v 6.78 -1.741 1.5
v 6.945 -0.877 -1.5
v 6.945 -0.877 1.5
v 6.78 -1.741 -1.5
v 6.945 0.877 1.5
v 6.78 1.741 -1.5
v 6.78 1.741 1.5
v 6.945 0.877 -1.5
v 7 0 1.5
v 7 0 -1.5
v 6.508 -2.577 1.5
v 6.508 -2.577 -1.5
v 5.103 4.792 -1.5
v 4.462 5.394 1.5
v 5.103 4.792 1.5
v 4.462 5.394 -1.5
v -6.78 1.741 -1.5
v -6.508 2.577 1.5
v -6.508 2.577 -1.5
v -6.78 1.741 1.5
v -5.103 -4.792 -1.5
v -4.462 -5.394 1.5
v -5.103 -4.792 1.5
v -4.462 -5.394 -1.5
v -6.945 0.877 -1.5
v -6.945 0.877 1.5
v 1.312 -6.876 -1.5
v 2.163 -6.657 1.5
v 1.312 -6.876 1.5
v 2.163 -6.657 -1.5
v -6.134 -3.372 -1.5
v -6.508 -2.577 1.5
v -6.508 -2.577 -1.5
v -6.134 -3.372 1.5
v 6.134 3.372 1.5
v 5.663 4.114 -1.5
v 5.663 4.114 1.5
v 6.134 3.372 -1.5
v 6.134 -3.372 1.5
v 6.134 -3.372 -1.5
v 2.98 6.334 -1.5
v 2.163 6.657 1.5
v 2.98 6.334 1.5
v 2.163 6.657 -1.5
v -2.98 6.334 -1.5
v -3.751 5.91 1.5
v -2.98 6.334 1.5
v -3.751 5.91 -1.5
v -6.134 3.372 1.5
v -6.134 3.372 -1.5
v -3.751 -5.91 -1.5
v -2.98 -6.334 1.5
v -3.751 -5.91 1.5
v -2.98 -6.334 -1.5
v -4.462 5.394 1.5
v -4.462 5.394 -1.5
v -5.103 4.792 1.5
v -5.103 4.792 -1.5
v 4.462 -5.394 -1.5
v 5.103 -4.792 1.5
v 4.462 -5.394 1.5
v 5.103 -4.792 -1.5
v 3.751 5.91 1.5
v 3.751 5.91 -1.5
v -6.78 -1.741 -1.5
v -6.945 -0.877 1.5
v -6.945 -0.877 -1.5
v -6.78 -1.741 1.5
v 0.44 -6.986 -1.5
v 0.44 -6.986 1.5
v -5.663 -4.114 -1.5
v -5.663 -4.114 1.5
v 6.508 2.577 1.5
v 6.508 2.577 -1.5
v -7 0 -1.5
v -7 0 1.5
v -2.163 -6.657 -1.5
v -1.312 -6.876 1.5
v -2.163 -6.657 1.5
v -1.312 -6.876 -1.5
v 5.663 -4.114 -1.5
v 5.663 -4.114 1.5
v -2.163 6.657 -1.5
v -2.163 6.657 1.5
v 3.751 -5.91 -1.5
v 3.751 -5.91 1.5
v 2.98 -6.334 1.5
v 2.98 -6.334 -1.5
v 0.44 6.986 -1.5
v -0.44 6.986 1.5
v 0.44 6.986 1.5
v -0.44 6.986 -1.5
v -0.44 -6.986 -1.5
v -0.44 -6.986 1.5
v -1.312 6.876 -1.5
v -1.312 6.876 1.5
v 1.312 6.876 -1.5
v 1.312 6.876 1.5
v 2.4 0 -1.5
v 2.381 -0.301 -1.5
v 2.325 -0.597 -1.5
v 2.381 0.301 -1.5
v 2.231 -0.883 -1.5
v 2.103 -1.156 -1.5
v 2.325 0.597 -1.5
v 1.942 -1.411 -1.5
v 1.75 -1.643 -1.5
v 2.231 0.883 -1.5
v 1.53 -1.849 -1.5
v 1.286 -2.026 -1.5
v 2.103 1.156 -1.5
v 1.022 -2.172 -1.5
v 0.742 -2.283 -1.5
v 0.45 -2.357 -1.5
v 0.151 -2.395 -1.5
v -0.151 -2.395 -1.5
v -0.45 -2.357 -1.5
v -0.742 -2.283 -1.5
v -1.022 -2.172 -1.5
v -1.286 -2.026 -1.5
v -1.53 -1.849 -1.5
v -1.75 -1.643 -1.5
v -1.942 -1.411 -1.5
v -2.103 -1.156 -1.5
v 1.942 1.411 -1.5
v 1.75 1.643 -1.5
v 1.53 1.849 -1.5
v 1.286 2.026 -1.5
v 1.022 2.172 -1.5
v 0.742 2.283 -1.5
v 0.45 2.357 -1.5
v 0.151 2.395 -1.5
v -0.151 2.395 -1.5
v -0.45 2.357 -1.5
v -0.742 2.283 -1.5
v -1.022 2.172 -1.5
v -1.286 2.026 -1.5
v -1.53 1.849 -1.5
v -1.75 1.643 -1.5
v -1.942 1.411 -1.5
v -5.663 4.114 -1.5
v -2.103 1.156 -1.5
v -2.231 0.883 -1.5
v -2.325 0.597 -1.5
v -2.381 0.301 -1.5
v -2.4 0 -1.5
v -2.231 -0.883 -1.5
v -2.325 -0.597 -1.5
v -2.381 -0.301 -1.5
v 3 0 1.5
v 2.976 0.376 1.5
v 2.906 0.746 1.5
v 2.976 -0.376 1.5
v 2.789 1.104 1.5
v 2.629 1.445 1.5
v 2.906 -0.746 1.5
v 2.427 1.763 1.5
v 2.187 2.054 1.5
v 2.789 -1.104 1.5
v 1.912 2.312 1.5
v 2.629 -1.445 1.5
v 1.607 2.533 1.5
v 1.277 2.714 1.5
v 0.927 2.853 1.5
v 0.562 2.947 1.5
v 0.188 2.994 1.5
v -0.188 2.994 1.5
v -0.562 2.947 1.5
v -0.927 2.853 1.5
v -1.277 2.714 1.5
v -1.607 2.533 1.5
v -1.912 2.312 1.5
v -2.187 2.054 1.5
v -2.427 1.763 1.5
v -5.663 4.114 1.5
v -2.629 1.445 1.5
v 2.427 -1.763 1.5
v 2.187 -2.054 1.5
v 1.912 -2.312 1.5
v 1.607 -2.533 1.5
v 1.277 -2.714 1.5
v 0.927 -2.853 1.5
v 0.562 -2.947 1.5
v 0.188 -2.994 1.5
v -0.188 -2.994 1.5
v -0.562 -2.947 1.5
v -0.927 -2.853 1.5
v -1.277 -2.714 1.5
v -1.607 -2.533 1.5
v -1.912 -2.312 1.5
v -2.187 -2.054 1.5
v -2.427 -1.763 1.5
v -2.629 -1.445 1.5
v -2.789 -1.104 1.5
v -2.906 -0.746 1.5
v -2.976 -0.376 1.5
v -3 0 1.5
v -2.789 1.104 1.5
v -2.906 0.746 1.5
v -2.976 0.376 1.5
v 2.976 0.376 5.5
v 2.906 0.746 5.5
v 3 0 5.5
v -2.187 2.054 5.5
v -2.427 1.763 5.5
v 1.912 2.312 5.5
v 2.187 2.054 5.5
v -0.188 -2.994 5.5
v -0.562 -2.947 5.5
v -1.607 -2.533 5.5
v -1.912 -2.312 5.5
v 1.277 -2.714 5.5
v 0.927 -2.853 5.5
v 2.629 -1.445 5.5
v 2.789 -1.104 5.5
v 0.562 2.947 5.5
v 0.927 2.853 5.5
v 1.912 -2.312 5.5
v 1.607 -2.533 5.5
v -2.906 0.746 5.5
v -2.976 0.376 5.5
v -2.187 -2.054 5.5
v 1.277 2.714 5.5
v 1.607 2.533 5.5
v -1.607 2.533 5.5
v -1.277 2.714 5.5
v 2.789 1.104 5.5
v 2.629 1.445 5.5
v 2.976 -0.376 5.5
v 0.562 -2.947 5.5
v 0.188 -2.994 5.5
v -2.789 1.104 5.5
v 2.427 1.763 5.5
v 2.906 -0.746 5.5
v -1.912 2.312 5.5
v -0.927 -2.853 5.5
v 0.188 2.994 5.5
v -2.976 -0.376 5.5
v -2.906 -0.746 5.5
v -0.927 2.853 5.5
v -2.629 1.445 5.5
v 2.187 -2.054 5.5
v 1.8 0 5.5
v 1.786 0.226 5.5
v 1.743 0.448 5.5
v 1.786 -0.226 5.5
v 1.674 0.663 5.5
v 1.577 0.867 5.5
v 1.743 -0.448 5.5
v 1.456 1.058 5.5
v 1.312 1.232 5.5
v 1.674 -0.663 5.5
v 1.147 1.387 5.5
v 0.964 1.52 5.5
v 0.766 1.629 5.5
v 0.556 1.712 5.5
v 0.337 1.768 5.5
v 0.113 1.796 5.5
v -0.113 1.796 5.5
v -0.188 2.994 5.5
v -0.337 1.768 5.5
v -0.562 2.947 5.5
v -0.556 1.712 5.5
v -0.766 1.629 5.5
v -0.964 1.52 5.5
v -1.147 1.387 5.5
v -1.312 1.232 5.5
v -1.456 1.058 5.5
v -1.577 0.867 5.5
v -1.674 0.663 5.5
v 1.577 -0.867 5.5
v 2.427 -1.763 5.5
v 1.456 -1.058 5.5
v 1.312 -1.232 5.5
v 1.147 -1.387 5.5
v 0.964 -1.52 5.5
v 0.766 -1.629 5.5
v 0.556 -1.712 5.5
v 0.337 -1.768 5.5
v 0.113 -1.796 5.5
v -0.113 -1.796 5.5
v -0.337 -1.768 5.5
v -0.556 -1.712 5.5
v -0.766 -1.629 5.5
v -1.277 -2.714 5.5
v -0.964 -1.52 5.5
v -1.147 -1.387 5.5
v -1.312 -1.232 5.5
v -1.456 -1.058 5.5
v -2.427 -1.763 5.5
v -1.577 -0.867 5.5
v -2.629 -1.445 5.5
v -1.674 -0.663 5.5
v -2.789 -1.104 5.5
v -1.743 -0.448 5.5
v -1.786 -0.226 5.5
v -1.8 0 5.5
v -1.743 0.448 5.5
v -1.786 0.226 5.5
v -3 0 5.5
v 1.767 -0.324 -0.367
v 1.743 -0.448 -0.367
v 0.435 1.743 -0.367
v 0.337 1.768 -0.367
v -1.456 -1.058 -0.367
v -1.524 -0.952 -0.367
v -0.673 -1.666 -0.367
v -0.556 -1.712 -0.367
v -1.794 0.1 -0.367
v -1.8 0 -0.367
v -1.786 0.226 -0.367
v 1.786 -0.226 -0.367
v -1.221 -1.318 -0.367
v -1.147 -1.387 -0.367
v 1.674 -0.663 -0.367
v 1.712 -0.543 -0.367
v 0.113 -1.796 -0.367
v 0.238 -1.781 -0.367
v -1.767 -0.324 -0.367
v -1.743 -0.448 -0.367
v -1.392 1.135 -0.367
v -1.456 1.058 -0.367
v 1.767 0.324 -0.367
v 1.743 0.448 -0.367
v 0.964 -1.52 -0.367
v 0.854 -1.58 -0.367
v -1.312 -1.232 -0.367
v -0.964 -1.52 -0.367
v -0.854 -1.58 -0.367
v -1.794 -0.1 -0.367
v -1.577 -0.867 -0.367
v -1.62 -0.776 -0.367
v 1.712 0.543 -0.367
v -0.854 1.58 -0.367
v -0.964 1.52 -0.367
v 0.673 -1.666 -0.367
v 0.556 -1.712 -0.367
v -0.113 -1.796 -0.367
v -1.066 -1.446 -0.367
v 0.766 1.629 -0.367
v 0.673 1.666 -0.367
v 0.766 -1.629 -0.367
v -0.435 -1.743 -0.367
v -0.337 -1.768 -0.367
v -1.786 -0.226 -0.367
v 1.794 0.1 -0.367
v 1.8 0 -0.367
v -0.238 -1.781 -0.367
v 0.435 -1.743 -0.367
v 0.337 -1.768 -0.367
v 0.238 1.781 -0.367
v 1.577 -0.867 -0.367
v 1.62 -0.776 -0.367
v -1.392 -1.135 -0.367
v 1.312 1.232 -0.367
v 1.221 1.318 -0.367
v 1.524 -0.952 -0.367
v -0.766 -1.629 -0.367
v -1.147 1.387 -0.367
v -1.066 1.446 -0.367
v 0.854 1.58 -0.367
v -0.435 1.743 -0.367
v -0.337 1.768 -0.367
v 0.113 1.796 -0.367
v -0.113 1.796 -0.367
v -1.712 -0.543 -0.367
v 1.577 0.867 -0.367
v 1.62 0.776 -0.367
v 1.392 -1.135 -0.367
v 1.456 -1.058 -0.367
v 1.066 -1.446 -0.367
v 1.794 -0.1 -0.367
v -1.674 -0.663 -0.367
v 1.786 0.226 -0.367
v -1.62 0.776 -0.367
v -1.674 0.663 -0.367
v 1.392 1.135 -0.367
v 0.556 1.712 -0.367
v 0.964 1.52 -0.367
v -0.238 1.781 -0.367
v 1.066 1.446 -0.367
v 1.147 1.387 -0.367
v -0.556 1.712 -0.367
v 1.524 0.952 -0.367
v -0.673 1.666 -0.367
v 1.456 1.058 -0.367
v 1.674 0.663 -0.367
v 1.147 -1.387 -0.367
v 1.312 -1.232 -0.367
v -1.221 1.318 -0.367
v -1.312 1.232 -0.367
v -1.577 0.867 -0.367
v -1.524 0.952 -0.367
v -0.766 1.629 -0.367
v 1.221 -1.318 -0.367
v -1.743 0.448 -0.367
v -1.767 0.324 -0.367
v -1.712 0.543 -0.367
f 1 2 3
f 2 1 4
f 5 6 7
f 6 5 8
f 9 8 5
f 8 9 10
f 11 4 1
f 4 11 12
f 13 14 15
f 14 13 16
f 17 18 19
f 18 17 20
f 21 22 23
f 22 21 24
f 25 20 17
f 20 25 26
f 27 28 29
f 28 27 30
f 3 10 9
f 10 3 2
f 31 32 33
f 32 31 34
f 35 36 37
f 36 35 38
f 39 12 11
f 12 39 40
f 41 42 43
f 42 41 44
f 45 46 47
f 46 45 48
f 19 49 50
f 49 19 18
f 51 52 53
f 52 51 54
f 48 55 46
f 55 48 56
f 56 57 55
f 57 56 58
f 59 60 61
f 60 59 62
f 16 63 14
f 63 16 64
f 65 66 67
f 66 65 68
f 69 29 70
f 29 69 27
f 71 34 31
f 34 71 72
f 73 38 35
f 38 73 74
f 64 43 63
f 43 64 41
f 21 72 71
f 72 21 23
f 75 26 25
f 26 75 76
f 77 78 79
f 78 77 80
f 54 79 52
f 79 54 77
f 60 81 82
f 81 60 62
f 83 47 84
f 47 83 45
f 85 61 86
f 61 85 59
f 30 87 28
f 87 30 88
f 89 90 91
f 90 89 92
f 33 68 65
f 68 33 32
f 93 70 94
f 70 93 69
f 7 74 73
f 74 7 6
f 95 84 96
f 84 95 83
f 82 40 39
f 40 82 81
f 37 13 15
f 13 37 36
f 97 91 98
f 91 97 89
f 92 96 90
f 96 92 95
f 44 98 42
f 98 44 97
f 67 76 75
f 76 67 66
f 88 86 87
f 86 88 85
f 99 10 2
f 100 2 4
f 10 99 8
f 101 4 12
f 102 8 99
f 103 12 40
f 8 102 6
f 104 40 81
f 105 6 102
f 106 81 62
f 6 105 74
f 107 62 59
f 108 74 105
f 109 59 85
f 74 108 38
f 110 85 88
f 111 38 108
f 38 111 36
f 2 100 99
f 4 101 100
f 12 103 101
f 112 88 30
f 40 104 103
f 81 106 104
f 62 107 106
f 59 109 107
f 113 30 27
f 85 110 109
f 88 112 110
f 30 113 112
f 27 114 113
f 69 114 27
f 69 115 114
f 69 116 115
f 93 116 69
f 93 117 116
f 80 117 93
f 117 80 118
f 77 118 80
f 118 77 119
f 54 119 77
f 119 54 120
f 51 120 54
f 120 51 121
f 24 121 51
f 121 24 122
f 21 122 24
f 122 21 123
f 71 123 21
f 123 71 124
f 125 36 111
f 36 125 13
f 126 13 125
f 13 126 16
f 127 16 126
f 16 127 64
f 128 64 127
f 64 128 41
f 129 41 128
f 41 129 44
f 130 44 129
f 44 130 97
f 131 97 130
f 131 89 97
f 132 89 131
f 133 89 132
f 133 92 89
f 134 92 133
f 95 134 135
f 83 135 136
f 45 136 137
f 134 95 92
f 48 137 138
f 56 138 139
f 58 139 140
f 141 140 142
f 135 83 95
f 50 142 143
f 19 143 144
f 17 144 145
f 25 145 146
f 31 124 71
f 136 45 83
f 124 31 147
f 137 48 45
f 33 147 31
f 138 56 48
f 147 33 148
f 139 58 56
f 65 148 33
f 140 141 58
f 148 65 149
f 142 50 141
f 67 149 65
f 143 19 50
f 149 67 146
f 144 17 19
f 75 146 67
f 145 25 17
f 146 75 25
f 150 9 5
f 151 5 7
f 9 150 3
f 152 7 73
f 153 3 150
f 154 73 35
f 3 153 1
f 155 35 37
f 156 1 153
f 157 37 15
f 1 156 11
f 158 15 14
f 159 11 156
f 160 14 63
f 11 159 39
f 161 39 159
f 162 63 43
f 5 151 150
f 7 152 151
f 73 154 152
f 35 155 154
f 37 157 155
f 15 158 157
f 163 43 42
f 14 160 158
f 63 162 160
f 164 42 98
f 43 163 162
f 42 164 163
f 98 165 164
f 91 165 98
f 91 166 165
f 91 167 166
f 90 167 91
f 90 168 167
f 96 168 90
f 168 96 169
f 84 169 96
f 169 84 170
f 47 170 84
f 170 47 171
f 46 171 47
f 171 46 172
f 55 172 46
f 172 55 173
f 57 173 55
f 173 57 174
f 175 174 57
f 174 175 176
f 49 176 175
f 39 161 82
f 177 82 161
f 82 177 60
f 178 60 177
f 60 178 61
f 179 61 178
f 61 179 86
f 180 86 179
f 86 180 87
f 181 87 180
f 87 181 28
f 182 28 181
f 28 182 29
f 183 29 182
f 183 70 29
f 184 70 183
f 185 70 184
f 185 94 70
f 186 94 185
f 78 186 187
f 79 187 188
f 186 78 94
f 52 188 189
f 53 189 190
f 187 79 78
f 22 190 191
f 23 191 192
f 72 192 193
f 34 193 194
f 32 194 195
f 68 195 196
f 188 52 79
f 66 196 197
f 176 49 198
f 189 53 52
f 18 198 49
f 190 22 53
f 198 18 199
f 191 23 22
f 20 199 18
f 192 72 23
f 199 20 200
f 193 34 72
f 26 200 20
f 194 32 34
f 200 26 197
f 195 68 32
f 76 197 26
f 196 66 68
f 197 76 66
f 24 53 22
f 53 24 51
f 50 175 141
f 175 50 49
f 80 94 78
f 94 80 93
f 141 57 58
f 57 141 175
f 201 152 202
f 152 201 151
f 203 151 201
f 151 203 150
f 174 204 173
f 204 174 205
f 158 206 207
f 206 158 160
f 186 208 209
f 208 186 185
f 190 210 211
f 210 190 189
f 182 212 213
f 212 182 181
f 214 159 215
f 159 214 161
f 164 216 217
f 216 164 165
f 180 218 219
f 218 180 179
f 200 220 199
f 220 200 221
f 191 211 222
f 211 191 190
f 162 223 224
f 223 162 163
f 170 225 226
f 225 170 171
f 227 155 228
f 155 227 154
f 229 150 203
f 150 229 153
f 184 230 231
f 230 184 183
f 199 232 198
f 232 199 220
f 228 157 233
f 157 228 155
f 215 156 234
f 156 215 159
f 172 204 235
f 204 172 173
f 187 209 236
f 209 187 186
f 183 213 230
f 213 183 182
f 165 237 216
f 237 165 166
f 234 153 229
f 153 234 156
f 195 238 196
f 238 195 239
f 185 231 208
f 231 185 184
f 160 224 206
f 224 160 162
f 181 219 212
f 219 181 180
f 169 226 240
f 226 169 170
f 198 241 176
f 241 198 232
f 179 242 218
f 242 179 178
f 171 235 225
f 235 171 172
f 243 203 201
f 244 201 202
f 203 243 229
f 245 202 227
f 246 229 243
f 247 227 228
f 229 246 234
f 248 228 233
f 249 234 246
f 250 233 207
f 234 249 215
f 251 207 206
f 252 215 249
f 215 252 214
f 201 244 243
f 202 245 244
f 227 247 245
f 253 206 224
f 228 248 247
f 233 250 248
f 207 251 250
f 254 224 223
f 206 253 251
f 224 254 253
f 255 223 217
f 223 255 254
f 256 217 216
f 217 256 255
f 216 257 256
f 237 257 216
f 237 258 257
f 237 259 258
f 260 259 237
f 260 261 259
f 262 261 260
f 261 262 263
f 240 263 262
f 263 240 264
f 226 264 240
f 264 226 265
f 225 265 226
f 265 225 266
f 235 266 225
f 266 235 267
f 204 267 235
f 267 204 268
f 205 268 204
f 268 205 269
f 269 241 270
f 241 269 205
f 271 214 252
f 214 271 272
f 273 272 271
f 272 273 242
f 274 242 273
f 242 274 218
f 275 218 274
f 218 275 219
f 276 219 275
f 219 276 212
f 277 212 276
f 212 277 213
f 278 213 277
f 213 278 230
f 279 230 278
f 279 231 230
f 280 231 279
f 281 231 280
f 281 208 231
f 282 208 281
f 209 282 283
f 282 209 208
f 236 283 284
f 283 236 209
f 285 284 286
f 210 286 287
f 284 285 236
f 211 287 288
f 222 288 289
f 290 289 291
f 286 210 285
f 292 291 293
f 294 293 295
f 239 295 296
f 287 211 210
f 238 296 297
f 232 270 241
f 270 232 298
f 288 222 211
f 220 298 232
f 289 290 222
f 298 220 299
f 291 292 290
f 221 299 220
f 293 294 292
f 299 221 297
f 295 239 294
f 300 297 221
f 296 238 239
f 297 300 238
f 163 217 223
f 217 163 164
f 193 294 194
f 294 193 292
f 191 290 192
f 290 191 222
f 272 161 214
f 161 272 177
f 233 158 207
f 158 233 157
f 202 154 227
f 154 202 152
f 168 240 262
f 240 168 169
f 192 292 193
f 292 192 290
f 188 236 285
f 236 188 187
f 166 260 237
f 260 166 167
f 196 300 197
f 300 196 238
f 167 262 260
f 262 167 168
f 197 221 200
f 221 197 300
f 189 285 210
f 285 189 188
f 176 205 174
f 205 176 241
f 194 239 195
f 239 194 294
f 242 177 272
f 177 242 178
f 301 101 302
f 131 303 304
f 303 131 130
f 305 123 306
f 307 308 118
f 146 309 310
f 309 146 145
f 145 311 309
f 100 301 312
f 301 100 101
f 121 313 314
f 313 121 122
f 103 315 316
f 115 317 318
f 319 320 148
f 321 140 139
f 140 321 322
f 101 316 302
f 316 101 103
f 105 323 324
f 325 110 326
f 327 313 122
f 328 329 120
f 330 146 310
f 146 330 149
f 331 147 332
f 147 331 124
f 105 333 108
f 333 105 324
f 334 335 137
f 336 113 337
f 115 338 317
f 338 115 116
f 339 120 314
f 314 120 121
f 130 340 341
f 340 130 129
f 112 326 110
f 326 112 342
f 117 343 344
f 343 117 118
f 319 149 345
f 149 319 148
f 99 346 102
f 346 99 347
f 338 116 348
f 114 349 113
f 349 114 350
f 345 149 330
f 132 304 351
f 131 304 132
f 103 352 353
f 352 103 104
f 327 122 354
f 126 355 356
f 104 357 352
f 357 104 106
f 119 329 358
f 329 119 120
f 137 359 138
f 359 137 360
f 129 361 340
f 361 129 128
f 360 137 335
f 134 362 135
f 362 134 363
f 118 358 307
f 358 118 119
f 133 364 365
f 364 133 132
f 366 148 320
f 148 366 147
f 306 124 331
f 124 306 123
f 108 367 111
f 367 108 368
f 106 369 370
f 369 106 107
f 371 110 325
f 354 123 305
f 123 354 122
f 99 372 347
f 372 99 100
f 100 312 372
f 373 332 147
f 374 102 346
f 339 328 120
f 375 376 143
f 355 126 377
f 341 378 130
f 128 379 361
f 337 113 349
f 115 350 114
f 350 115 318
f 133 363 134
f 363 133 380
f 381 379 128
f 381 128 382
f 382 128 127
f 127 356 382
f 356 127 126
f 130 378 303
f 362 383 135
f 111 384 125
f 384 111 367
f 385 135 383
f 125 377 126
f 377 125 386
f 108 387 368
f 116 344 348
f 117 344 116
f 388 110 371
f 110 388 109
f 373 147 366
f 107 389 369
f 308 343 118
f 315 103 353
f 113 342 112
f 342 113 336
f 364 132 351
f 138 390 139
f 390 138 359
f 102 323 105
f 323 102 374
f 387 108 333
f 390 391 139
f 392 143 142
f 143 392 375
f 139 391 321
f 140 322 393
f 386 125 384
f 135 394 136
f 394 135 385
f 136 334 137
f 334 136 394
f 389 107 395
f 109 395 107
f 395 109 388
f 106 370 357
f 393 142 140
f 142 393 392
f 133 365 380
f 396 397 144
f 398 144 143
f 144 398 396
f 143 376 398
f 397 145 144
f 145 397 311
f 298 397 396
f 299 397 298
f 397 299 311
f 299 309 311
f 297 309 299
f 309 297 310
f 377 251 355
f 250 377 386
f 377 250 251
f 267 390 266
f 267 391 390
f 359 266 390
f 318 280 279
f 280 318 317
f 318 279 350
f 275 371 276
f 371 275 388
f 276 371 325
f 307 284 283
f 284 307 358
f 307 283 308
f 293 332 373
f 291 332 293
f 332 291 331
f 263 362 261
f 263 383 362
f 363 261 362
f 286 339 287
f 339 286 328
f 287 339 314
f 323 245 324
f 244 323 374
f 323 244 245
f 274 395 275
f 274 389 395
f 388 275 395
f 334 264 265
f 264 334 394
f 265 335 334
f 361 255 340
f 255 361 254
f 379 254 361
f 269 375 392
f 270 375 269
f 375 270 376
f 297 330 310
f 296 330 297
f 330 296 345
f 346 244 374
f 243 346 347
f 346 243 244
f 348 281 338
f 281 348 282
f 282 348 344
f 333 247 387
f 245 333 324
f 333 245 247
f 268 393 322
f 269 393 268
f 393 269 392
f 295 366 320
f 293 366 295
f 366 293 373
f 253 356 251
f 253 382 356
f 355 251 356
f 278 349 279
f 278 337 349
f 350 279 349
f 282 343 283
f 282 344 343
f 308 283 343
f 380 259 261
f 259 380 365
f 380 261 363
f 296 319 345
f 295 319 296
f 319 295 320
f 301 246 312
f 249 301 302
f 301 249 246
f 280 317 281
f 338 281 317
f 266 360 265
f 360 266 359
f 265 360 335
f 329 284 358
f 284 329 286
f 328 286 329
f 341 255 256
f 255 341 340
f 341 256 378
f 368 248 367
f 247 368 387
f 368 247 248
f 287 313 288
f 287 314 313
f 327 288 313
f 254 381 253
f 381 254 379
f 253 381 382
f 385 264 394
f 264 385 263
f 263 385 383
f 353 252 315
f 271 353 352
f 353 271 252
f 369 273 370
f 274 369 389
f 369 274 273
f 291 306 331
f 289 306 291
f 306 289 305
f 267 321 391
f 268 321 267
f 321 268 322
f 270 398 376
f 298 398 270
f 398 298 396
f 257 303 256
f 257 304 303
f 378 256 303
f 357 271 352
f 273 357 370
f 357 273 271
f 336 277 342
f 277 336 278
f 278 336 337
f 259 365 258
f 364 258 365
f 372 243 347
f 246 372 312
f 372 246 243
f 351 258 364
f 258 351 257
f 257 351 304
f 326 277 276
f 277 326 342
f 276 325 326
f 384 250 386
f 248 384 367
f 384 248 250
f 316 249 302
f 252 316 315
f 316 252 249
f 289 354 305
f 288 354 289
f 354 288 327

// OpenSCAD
$fn = 50;


difference() {
	union() {
		translate(v = [0, 0, -1.5000000000]) {
			cylinder(h = 3, r = 7.0000000000);
		}
		translate(v = [0, 0, -1.5000000000]) {
			cylinder(h = 7, r = 3.0000000000);
		}
	}
	union() {
		translate(v = [0, 0, -1.5000000000]) {
			rotate(a = [0, 180, 0]) {
				difference() {
					union() {
						translate(v = [0, 0, -1.7000000000]) {
							cylinder(h = 1.7000000000, r1 = 1.5000000000, r2 = 2.4000000000);
						}
						translate(v = [0, 0, -7.0000000000]) {
							cylinder(h = 7, r = 1.5000000000);
						}
						translate(v = [0, 0, -7.0000000000]) {
							cylinder(h = 7, r = 1.8000000000);
						}
						translate(v = [0, 0, -7.0000000000]) {
							cylinder(h = 7, r = 1.5000000000);
						}
					}
					union();
				}
			}
		}
		translate(v = [0, 0, -100.0000000000]) {
			cylinder(h = 200, r = 1.5000000000);
		}
	}
}
